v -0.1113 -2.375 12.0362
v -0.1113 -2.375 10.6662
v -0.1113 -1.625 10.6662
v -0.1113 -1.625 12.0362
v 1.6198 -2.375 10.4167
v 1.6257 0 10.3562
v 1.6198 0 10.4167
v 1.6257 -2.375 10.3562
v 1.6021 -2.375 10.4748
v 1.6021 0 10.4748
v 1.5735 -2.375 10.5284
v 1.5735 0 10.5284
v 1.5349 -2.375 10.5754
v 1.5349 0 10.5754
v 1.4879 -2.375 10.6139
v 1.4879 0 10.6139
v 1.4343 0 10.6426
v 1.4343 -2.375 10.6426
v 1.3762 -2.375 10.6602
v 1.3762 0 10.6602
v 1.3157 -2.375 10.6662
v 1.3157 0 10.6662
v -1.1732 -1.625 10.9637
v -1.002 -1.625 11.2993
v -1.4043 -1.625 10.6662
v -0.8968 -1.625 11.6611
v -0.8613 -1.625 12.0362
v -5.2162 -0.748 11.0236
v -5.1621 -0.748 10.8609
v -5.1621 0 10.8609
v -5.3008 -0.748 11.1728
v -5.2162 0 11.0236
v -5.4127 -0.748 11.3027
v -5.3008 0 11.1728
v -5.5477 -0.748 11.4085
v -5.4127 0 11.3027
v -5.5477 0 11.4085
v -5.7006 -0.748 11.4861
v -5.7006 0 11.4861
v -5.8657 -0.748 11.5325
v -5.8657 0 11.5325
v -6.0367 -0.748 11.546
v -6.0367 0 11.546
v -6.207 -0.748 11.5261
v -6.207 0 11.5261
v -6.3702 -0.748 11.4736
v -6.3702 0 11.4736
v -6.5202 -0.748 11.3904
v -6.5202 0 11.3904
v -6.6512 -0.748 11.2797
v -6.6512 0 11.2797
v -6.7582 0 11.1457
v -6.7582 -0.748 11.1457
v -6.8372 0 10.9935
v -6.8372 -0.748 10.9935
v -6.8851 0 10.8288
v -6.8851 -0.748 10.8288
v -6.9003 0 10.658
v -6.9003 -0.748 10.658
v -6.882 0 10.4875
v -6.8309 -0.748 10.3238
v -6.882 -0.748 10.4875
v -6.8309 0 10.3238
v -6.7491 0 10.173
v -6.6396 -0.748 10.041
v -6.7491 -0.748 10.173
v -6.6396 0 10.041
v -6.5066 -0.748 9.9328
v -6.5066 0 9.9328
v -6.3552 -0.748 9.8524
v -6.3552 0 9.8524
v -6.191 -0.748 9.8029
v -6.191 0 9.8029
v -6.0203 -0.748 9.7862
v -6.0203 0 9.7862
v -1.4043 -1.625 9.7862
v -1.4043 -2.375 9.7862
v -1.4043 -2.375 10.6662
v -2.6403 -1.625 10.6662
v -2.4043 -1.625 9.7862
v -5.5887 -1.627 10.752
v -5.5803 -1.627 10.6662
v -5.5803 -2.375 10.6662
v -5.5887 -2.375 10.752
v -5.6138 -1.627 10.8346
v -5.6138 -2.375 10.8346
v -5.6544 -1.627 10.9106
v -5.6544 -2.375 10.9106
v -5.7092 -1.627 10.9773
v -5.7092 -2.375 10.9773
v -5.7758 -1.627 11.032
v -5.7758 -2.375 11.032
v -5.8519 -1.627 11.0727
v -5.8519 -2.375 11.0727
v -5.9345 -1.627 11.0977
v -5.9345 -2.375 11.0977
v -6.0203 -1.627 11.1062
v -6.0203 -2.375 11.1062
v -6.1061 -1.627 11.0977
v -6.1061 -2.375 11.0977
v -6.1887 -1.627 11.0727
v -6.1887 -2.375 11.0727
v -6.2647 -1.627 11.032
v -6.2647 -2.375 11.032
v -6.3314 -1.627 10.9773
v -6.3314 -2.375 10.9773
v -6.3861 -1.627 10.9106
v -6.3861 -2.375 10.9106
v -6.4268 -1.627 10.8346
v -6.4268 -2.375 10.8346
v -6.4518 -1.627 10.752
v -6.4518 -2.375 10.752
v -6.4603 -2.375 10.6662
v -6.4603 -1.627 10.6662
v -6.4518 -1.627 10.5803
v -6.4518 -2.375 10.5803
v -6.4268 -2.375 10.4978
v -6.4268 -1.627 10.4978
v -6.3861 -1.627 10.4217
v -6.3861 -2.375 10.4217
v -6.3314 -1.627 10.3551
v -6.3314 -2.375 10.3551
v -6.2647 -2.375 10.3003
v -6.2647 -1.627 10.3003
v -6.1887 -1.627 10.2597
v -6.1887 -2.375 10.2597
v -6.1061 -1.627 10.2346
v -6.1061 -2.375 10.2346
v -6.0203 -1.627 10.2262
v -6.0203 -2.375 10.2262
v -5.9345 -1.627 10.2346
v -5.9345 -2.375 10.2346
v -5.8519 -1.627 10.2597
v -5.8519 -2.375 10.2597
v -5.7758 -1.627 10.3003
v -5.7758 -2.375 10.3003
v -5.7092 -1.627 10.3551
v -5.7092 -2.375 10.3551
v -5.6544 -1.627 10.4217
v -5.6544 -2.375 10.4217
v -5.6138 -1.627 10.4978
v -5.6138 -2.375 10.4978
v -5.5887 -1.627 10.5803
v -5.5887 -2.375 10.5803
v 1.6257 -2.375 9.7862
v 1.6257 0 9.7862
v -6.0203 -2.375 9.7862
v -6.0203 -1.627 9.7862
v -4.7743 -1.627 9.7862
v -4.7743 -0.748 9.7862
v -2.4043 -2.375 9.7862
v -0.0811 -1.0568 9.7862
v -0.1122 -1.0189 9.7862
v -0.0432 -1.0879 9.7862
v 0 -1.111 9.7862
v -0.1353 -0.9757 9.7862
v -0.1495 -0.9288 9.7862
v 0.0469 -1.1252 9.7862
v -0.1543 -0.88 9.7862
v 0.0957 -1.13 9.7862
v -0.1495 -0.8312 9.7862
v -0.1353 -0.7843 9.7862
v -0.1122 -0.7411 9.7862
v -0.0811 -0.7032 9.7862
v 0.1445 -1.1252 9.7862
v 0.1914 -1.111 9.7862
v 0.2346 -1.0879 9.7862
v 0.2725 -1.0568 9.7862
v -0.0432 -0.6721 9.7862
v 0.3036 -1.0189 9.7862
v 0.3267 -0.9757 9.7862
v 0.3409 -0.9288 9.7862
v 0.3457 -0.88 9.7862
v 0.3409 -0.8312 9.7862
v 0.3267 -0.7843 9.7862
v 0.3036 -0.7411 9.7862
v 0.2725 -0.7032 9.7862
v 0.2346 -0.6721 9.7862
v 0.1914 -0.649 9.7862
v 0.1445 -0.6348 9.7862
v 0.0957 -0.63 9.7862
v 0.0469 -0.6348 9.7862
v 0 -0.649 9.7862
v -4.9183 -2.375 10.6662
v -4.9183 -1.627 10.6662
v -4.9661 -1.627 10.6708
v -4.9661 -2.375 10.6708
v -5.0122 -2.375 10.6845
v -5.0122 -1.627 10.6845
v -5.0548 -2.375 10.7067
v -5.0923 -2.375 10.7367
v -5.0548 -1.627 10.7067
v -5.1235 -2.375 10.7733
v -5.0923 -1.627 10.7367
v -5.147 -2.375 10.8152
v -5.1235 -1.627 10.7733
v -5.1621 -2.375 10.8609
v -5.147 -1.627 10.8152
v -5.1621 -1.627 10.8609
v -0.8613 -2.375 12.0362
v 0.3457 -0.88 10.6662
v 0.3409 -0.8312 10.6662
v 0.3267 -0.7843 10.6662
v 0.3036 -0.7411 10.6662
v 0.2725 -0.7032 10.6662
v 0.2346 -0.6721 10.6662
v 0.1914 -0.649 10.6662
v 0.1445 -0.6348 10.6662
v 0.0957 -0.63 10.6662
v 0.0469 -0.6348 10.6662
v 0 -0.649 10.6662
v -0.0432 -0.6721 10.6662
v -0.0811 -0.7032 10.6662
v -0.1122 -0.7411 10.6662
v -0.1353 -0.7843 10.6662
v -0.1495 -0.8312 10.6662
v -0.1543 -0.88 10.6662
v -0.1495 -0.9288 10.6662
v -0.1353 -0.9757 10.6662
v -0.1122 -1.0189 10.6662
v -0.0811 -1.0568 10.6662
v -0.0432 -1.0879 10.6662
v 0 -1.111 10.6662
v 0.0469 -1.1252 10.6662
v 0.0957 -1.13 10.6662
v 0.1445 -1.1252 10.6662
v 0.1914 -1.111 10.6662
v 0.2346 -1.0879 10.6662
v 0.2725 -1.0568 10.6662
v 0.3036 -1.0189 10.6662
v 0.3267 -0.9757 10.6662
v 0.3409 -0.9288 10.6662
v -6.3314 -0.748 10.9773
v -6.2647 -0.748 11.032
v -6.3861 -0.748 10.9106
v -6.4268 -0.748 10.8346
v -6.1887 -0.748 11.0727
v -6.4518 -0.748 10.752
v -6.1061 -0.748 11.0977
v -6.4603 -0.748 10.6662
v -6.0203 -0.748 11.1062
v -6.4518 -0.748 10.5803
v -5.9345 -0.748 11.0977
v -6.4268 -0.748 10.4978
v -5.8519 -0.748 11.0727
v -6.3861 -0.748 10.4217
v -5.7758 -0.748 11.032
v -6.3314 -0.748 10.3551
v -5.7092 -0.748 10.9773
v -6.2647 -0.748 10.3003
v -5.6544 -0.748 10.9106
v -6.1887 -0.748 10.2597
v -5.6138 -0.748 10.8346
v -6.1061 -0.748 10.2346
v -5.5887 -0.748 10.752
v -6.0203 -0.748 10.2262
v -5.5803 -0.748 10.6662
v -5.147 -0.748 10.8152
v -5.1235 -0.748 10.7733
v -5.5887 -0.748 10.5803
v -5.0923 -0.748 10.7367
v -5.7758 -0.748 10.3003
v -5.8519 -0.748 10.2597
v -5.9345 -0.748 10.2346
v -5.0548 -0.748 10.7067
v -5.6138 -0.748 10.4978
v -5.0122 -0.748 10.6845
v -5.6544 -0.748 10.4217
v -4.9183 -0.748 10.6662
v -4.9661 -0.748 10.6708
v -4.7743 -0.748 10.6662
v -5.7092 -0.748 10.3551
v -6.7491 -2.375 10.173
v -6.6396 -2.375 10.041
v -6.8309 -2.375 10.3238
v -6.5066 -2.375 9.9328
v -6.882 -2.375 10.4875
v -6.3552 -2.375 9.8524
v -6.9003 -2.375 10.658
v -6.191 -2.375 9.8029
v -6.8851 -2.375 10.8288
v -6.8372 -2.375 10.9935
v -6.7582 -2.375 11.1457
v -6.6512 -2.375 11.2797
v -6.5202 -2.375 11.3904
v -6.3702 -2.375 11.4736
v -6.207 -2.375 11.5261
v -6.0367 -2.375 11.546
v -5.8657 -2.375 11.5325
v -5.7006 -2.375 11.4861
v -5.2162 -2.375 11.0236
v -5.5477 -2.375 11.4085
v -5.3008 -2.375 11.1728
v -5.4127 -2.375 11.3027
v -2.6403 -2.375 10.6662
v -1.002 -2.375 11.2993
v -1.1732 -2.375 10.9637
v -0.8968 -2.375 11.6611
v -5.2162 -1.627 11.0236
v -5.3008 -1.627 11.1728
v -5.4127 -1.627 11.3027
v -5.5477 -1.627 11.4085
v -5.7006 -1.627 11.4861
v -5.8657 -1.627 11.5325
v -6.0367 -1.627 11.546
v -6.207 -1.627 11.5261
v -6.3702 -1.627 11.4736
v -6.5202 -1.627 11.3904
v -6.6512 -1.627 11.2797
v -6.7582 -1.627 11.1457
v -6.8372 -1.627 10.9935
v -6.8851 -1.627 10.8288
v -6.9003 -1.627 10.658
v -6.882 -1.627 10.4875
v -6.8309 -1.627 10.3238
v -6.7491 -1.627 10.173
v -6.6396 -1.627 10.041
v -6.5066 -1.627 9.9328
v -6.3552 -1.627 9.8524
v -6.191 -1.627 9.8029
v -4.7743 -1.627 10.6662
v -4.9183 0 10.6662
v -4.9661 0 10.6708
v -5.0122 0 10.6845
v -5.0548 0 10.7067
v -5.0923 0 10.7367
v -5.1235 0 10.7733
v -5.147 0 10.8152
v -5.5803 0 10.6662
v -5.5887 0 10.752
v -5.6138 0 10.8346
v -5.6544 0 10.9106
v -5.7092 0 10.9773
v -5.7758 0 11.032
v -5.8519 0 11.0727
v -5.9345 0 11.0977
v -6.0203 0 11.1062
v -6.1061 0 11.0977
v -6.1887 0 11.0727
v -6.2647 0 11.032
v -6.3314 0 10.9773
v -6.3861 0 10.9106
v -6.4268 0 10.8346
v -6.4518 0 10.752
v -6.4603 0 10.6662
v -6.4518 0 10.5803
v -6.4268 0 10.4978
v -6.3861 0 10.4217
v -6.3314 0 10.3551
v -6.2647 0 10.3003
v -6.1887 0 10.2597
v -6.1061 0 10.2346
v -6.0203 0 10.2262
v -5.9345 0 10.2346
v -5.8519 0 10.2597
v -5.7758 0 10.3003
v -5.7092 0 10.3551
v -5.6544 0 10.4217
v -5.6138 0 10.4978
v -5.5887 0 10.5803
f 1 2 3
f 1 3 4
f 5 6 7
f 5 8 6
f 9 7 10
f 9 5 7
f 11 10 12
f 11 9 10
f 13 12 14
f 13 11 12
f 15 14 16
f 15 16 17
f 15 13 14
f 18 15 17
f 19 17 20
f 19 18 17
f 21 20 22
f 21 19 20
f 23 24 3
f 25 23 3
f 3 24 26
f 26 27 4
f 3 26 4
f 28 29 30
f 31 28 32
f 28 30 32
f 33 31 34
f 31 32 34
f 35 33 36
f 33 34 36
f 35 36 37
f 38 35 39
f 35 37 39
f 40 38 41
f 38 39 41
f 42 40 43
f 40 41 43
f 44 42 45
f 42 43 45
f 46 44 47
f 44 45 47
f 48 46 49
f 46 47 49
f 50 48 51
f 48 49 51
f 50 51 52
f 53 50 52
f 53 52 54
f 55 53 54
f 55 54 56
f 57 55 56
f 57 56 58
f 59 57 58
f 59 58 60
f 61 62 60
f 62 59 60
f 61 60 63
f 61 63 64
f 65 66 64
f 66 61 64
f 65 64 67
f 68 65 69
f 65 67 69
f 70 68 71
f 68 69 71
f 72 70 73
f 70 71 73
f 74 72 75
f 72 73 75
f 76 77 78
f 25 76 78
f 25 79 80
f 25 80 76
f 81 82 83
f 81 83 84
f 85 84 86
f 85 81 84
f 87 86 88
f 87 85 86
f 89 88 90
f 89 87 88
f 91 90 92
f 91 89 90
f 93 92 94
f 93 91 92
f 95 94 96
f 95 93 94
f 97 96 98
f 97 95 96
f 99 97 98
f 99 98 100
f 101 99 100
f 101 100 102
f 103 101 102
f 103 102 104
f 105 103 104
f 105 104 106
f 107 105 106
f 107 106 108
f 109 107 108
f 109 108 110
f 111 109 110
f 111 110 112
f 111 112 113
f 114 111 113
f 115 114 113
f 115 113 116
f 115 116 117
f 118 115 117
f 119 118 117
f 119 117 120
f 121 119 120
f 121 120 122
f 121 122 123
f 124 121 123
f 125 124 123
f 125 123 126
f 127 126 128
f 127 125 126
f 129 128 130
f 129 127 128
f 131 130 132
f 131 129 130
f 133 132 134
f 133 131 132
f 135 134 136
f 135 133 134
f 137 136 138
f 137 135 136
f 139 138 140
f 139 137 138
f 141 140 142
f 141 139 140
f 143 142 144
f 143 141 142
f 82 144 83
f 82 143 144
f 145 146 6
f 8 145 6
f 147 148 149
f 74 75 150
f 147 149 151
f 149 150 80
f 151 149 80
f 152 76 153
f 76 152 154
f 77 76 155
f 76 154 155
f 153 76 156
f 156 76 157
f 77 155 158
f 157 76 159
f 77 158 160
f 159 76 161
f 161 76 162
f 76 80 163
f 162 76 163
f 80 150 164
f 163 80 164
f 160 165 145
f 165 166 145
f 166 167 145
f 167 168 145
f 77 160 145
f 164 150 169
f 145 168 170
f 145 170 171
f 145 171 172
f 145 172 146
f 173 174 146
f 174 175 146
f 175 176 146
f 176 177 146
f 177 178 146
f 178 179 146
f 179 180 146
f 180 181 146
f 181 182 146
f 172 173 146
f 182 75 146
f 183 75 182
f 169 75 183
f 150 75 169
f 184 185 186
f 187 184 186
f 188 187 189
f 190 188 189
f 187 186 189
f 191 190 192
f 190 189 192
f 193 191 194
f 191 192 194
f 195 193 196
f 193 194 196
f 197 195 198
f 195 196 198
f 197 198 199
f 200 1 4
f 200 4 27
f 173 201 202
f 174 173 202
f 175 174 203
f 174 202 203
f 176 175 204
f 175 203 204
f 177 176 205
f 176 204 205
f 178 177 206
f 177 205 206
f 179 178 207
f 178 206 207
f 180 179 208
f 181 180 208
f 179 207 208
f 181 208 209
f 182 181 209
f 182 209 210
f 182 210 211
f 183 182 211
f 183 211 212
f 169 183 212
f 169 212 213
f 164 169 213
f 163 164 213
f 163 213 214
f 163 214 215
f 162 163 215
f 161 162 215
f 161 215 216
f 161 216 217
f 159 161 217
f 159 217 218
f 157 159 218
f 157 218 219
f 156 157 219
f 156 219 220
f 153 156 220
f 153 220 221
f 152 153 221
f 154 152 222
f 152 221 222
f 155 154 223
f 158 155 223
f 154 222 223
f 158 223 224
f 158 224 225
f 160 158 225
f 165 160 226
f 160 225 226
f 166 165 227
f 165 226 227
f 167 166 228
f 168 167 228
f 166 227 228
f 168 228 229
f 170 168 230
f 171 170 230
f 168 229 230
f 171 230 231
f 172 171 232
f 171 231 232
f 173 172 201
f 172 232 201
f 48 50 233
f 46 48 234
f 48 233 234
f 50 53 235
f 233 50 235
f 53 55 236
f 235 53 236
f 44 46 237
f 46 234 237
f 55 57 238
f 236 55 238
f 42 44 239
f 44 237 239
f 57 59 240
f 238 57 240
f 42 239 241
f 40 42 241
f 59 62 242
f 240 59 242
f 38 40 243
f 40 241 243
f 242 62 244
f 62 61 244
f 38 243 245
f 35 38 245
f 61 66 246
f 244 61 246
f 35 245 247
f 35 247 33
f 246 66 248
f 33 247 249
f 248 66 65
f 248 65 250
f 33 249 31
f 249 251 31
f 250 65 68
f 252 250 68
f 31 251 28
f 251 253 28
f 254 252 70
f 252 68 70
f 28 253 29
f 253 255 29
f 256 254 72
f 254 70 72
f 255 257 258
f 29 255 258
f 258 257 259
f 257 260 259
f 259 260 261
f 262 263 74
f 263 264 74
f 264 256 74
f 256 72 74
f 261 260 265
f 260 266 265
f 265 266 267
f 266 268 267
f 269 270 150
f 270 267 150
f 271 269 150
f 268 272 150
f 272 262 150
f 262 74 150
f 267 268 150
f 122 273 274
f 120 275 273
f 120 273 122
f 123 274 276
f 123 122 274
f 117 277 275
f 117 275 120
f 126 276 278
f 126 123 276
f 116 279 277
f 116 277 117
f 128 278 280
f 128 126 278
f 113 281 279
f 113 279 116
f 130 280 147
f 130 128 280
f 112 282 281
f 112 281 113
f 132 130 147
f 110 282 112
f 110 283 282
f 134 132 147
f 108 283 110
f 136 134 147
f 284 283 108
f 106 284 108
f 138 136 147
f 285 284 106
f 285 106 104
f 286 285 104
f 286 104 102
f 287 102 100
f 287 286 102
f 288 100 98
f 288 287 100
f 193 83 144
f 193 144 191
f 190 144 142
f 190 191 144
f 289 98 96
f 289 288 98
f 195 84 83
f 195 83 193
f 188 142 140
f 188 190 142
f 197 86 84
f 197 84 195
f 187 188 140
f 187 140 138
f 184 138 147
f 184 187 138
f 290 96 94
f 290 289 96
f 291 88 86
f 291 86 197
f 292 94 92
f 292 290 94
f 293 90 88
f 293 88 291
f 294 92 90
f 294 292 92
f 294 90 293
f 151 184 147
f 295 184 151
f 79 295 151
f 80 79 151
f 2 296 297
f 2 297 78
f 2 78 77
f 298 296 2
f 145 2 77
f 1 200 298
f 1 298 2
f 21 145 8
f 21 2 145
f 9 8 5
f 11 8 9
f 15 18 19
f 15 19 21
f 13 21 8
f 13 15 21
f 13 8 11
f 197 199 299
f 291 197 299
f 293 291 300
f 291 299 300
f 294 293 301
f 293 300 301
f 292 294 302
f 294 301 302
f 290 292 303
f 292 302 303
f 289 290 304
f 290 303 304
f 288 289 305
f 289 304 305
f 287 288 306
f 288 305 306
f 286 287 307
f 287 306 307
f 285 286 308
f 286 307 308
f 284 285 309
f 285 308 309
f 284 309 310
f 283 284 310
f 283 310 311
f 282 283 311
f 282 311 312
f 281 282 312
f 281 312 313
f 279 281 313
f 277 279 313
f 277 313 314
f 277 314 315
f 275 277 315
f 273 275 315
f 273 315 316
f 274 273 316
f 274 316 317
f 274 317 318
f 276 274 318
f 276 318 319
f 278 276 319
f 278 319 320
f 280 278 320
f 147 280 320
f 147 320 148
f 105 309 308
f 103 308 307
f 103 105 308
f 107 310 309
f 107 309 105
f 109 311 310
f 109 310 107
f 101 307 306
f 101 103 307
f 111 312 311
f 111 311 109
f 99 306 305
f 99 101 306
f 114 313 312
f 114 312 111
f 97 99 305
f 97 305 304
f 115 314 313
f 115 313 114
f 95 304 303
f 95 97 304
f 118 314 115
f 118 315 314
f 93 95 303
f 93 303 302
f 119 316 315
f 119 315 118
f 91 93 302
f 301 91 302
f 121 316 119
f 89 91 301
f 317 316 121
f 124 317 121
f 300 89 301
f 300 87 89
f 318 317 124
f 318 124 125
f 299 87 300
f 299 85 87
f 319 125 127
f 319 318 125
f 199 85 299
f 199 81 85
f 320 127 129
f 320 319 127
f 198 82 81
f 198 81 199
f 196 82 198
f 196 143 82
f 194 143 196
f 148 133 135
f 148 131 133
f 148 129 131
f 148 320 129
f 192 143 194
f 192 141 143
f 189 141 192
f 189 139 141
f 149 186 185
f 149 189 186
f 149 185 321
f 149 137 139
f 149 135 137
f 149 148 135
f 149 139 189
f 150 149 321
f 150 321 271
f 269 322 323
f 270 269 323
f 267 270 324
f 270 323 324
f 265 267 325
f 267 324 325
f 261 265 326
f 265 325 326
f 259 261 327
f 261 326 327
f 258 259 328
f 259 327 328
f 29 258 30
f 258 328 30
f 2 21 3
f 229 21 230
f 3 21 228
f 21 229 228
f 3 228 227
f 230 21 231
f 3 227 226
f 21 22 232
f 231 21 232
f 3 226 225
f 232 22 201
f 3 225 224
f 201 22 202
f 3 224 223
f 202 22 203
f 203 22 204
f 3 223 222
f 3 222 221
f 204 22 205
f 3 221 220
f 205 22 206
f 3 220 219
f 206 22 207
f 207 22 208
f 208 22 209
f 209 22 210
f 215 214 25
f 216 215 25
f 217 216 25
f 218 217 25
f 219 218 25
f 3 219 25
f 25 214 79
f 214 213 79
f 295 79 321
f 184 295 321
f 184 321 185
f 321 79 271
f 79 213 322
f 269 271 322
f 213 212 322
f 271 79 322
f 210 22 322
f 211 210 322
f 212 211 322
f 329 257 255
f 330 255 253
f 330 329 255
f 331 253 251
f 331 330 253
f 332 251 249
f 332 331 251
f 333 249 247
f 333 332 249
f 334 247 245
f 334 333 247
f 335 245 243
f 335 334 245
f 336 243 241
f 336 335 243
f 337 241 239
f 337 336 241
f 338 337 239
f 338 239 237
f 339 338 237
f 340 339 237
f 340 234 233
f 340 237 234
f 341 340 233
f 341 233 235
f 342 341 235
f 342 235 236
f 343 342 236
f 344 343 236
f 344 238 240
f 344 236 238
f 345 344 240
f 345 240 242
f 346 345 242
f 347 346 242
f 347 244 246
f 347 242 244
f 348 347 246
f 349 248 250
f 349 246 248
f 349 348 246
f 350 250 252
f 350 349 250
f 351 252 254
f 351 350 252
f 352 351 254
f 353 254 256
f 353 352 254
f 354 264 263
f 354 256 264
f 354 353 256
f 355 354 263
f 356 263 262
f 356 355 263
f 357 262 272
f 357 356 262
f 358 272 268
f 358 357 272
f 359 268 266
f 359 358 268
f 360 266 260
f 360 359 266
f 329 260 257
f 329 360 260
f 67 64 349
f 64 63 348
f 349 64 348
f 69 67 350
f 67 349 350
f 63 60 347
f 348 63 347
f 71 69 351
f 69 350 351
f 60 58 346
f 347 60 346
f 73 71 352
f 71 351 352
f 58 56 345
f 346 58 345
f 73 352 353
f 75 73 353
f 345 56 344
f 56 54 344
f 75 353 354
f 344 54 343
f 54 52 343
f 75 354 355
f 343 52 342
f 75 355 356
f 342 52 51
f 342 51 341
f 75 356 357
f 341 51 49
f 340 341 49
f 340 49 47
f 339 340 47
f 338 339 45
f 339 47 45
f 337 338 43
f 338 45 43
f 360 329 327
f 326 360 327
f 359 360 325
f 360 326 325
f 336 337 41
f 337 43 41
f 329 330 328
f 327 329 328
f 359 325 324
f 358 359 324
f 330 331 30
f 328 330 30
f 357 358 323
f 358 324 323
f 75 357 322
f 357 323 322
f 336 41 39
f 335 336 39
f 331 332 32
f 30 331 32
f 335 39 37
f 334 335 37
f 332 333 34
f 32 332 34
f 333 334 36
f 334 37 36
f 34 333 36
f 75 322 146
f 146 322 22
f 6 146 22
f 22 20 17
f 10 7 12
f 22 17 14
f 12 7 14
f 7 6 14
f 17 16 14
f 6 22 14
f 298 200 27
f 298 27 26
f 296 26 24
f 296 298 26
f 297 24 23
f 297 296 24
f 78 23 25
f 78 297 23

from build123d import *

# Parameters (mm, degrees)
F0_R     = 0.44
F1_DEPTH = 2.375
F2_W     = 2.5913788058
F2_H     = 0.879
F3_DEPTH = 25
F5_DEPTH = 0.75
F7_DEPTH = 0.75
F8_R     = 0.25
F9_DEPTH = 25
F10_R    = 0.31


with BuildPart() as f1:
    # F0 (on Front) → F1 (new body)
    with BuildSketch(Plane.XZ):
        with BuildLine():
            ThreePointArc((-4.9182944256, 10.6661773273), (-5.0742953332, 10.7208219669), (-5.1620993338, 10.8608675928))
            ThreePointArc((-5.1620993338, 10.8608675928), (-6.7079434791, 11.2153005222), (-6.0202926107, 9.7861773273))
            Line((-6.0202926107, 9.7861773273), (-5.5571346355, 9.7861773273))
            Line((-5.5571346355, 9.7861773273), (1.6257073893, 9.7861773273))
            Line((1.6257073893, 9.7861773273), (1.6257073893, 10.6661773273))
            Line((1.6257073893, 10.6661773273), (-4.9182944256, 10.6661773273))
        make_face()
        with Locations((-6.0202926107, 10.6661773273)):
            Circle(F0_R, mode=Mode.SUBTRACT)
    extrude(amount=F1_DEPTH)

    # F2 (on Top) → F3 (cut)
    with BuildSketch(Plane.XY):
        with Locations((-6.0699820136, -1.1875)):
            Rectangle(F2_W, F2_H)
    extrude(amount=F3_DEPTH, mode=Mode.SUBTRACT)

    # F4 (on face) → F5 (cut)
    with BuildSketch(Plane.XZ.offset(2.375)):
        Polygon((-1.4042926107, 10.6661773273), (-2.6402926107, 10.6661773273), (-2.4042926107, 9.7861773273), (-1.4042926107, 9.7861773273), align=None)
    extrude(amount=-F5_DEPTH, mode=Mode.SUBTRACT)

    # F6 (on face) → F7 (join)
    with BuildSketch(Plane.XZ.offset(2.375)):
        with BuildLine():
            ThreePointArc((-0.8612926107, 12.0361773273), (-1.0020085413, 11.2993410136), (-1.4042926107, 10.6661773273))
            Line((-1.4042926107, 10.6661773273), (-0.1112926107, 10.6661773273))
            Line((-0.1112926107, 10.6661773273), (-0.1112926107, 12.0361773273))
            Line((-0.1112926107, 12.0361773273), (-0.8612926107, 12.0361773273))
        make_face()
    extrude(amount=-F7_DEPTH)

    # F8 (on face) → F9 (cut)
    with BuildSketch(Plane.XY.offset(10.6661773273)):
        with Locations((0.0957073893, -0.88)):
            Circle(F8_R)
    extrude(amount=-F9_DEPTH, mode=Mode.SUBTRACT)

    # F10
    f10_edges = [f1.edges().sort_by_distance(p)[0] for p in [
        (1.625707, -1.1875, 10.666177),
    ]]
    fillet(f10_edges, radius=F10_R)


solid = f1.part
